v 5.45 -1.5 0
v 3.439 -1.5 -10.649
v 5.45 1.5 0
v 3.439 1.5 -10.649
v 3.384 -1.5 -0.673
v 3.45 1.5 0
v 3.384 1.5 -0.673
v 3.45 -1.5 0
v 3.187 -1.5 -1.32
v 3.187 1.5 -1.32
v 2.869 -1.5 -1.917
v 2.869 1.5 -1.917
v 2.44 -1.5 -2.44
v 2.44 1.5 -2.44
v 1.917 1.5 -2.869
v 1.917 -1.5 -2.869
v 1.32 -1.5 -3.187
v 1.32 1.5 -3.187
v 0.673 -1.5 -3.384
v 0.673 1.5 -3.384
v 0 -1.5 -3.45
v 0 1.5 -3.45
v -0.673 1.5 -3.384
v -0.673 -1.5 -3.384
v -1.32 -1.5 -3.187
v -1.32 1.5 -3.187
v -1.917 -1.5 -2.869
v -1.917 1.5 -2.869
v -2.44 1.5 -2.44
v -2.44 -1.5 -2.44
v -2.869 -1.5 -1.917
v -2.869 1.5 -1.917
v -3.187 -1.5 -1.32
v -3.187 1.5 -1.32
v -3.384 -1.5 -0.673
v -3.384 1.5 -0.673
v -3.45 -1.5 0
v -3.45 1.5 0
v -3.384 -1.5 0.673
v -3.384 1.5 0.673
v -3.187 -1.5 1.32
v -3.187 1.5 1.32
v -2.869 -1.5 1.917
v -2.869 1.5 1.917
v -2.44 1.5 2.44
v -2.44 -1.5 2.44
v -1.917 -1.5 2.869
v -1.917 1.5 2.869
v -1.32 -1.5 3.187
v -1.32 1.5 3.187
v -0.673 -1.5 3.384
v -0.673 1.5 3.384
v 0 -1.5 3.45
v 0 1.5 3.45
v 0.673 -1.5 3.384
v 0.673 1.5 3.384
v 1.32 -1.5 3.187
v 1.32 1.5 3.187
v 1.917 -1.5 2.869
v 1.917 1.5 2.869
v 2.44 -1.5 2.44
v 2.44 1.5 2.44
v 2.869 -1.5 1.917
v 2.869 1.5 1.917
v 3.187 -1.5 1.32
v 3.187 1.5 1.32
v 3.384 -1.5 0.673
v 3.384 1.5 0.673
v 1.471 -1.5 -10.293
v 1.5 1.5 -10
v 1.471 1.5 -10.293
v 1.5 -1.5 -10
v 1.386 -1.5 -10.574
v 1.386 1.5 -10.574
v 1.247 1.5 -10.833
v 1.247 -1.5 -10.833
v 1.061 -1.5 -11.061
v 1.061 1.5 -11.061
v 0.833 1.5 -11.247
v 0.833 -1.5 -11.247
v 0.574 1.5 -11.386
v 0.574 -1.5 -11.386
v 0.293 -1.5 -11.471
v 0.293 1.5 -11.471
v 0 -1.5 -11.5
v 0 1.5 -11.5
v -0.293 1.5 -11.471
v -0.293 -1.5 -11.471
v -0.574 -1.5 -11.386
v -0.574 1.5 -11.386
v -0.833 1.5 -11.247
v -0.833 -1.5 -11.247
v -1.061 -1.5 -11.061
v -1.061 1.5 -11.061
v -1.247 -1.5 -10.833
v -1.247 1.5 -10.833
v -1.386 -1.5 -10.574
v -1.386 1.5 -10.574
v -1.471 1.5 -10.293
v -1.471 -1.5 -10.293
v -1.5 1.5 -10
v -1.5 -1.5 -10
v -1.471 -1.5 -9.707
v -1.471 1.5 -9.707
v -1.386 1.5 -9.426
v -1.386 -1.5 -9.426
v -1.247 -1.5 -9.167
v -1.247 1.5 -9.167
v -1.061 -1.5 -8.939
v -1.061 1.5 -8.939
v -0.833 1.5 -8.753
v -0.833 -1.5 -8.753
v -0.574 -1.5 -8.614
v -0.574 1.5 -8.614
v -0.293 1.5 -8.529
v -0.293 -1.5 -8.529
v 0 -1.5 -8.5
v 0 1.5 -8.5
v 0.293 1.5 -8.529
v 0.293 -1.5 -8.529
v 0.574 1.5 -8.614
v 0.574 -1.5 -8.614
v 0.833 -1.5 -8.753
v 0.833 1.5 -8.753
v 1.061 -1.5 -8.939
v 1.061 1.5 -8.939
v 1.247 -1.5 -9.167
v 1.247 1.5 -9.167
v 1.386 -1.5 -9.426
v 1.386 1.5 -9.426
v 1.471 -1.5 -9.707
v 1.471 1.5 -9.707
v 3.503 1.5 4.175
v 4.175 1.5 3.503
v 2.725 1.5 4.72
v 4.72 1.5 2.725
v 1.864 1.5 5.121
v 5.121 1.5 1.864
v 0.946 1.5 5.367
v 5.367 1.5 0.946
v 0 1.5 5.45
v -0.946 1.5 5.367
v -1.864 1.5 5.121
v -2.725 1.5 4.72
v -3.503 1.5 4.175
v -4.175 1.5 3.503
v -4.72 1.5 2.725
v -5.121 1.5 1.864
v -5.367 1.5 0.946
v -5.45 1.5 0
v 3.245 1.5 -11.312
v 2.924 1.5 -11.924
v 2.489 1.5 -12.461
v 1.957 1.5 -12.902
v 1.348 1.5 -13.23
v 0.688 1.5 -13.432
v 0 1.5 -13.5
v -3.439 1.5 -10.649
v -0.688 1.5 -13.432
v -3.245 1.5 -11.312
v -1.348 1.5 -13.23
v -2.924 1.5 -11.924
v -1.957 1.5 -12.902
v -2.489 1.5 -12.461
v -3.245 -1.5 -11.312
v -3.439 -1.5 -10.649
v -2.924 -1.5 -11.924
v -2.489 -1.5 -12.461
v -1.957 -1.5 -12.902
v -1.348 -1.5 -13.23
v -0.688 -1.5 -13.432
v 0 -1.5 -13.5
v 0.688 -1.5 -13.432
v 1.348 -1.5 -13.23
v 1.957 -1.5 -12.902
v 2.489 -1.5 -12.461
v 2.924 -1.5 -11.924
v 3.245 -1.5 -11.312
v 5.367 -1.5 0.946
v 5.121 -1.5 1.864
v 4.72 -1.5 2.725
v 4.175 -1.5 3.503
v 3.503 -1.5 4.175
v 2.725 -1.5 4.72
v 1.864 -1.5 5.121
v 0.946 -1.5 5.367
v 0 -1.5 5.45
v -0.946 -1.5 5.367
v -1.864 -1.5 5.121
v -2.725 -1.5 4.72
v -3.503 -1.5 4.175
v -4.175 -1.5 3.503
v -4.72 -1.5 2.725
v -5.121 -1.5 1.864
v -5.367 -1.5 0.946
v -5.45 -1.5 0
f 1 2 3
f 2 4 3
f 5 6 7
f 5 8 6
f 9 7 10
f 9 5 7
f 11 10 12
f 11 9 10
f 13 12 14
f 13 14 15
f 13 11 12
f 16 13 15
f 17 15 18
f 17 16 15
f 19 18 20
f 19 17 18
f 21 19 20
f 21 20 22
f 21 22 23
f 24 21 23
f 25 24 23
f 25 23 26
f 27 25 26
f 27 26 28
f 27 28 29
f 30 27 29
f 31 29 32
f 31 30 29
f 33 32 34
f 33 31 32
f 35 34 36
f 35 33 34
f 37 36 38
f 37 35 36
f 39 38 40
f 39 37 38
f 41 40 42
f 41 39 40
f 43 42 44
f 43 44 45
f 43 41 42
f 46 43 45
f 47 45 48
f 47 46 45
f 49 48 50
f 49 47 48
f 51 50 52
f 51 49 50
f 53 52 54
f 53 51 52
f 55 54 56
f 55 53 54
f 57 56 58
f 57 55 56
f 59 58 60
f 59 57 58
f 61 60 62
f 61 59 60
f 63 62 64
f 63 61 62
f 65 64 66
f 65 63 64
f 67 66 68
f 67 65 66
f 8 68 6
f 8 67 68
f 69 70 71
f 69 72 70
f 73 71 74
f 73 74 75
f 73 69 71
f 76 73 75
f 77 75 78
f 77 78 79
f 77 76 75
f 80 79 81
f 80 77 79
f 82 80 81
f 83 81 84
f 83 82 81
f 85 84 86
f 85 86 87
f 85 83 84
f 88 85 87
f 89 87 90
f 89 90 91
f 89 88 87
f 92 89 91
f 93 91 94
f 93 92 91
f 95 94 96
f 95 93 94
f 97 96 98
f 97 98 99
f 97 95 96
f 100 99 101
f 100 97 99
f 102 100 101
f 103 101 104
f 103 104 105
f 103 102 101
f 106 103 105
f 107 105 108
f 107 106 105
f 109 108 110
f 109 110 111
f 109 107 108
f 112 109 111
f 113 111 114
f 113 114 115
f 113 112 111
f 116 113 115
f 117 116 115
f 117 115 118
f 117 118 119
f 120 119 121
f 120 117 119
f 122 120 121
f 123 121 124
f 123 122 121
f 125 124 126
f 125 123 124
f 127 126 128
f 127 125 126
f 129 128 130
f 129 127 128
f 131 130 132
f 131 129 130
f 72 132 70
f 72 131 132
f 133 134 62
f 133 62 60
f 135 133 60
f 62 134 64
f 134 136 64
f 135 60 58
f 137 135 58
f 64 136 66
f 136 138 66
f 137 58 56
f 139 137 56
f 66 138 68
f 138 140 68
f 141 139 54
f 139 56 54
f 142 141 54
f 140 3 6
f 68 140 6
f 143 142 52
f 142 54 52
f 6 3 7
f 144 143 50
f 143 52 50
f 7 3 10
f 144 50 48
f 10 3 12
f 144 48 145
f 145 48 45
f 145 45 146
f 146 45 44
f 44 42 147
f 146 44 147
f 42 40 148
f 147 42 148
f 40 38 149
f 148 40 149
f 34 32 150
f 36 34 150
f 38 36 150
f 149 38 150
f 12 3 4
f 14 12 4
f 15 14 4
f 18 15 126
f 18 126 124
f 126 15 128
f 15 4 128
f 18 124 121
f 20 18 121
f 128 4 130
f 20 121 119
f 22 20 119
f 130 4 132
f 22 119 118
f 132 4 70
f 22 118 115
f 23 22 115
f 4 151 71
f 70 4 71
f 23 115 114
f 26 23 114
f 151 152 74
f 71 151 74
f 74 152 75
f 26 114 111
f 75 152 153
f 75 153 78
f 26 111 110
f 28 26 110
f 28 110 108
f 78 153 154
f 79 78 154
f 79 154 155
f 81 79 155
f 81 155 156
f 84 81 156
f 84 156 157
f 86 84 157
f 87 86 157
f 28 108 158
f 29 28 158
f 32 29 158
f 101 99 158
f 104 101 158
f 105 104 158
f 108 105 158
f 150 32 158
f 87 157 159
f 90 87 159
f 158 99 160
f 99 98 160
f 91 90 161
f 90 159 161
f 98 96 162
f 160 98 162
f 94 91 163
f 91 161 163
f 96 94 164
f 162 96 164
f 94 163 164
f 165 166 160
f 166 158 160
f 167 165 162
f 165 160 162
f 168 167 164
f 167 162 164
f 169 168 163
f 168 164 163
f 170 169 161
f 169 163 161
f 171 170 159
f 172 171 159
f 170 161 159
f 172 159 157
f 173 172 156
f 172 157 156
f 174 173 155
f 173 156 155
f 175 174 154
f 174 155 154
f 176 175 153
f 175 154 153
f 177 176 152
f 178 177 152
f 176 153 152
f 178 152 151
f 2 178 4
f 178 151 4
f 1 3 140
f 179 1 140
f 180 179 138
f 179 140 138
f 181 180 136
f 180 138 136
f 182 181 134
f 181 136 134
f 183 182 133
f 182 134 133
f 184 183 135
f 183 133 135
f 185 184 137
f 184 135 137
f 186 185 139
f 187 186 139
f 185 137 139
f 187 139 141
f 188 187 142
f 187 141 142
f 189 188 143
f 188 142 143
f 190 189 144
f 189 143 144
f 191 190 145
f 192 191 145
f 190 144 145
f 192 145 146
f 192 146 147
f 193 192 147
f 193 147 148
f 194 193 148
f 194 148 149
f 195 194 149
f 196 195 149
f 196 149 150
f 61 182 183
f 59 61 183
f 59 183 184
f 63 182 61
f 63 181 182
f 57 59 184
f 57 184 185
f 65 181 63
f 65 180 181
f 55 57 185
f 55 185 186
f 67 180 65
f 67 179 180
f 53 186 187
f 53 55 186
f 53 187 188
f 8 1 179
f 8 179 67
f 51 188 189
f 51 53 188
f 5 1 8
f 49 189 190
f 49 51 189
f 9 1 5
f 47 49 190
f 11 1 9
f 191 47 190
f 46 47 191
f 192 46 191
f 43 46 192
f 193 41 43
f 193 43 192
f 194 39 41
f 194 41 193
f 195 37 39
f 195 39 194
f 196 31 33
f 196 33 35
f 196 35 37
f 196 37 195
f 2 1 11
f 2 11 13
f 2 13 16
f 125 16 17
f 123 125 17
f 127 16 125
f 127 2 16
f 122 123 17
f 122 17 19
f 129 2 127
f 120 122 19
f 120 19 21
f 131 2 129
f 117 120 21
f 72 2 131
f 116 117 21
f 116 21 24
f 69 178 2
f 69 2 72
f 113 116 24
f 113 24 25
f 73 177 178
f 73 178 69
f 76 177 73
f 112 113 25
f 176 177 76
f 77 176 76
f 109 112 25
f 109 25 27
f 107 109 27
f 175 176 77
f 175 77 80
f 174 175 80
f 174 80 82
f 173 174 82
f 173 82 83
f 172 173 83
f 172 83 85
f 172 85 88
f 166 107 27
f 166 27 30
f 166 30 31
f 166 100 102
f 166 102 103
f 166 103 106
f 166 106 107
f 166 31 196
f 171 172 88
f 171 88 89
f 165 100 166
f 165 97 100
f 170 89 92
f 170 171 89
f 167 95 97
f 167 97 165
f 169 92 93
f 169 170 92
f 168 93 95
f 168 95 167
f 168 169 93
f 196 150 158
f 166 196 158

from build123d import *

# Parameters (mm, degrees)
SKETCH1_R           = 3.45
SKETCH1_R_2         = 1.5
BOSS_EXTRUDE1_DEPTH = 1.5


with BuildPart() as part:
    # Sketch1 → Boss-Extrude1 (new body, symmetric)
    with BuildSketch(Plane(origin=(0, 0, 0), x_dir=(1, 0, 0), z_dir=(0, 1, 0))):
        with BuildLine():
            Line((-5.45, 0), (-3.439230286, 10.649380506))
            ThreePointArc((-3.439230286, 10.649380506), (0, 13.5), (3.439230286, 10.649380506))
            Line((3.439230286, 10.649380506), (5.45, 0))
            ThreePointArc((5.45, 0), (0, -5.45), (-5.45, 0))
        make_face()
        Circle(SKETCH1_R, mode=Mode.SUBTRACT)
        with Locations((0, 10)):
            Circle(SKETCH1_R_2, mode=Mode.SUBTRACT)
    extrude(amount=BOSS_EXTRUDE1_DEPTH, both=True)


solid = part.part
